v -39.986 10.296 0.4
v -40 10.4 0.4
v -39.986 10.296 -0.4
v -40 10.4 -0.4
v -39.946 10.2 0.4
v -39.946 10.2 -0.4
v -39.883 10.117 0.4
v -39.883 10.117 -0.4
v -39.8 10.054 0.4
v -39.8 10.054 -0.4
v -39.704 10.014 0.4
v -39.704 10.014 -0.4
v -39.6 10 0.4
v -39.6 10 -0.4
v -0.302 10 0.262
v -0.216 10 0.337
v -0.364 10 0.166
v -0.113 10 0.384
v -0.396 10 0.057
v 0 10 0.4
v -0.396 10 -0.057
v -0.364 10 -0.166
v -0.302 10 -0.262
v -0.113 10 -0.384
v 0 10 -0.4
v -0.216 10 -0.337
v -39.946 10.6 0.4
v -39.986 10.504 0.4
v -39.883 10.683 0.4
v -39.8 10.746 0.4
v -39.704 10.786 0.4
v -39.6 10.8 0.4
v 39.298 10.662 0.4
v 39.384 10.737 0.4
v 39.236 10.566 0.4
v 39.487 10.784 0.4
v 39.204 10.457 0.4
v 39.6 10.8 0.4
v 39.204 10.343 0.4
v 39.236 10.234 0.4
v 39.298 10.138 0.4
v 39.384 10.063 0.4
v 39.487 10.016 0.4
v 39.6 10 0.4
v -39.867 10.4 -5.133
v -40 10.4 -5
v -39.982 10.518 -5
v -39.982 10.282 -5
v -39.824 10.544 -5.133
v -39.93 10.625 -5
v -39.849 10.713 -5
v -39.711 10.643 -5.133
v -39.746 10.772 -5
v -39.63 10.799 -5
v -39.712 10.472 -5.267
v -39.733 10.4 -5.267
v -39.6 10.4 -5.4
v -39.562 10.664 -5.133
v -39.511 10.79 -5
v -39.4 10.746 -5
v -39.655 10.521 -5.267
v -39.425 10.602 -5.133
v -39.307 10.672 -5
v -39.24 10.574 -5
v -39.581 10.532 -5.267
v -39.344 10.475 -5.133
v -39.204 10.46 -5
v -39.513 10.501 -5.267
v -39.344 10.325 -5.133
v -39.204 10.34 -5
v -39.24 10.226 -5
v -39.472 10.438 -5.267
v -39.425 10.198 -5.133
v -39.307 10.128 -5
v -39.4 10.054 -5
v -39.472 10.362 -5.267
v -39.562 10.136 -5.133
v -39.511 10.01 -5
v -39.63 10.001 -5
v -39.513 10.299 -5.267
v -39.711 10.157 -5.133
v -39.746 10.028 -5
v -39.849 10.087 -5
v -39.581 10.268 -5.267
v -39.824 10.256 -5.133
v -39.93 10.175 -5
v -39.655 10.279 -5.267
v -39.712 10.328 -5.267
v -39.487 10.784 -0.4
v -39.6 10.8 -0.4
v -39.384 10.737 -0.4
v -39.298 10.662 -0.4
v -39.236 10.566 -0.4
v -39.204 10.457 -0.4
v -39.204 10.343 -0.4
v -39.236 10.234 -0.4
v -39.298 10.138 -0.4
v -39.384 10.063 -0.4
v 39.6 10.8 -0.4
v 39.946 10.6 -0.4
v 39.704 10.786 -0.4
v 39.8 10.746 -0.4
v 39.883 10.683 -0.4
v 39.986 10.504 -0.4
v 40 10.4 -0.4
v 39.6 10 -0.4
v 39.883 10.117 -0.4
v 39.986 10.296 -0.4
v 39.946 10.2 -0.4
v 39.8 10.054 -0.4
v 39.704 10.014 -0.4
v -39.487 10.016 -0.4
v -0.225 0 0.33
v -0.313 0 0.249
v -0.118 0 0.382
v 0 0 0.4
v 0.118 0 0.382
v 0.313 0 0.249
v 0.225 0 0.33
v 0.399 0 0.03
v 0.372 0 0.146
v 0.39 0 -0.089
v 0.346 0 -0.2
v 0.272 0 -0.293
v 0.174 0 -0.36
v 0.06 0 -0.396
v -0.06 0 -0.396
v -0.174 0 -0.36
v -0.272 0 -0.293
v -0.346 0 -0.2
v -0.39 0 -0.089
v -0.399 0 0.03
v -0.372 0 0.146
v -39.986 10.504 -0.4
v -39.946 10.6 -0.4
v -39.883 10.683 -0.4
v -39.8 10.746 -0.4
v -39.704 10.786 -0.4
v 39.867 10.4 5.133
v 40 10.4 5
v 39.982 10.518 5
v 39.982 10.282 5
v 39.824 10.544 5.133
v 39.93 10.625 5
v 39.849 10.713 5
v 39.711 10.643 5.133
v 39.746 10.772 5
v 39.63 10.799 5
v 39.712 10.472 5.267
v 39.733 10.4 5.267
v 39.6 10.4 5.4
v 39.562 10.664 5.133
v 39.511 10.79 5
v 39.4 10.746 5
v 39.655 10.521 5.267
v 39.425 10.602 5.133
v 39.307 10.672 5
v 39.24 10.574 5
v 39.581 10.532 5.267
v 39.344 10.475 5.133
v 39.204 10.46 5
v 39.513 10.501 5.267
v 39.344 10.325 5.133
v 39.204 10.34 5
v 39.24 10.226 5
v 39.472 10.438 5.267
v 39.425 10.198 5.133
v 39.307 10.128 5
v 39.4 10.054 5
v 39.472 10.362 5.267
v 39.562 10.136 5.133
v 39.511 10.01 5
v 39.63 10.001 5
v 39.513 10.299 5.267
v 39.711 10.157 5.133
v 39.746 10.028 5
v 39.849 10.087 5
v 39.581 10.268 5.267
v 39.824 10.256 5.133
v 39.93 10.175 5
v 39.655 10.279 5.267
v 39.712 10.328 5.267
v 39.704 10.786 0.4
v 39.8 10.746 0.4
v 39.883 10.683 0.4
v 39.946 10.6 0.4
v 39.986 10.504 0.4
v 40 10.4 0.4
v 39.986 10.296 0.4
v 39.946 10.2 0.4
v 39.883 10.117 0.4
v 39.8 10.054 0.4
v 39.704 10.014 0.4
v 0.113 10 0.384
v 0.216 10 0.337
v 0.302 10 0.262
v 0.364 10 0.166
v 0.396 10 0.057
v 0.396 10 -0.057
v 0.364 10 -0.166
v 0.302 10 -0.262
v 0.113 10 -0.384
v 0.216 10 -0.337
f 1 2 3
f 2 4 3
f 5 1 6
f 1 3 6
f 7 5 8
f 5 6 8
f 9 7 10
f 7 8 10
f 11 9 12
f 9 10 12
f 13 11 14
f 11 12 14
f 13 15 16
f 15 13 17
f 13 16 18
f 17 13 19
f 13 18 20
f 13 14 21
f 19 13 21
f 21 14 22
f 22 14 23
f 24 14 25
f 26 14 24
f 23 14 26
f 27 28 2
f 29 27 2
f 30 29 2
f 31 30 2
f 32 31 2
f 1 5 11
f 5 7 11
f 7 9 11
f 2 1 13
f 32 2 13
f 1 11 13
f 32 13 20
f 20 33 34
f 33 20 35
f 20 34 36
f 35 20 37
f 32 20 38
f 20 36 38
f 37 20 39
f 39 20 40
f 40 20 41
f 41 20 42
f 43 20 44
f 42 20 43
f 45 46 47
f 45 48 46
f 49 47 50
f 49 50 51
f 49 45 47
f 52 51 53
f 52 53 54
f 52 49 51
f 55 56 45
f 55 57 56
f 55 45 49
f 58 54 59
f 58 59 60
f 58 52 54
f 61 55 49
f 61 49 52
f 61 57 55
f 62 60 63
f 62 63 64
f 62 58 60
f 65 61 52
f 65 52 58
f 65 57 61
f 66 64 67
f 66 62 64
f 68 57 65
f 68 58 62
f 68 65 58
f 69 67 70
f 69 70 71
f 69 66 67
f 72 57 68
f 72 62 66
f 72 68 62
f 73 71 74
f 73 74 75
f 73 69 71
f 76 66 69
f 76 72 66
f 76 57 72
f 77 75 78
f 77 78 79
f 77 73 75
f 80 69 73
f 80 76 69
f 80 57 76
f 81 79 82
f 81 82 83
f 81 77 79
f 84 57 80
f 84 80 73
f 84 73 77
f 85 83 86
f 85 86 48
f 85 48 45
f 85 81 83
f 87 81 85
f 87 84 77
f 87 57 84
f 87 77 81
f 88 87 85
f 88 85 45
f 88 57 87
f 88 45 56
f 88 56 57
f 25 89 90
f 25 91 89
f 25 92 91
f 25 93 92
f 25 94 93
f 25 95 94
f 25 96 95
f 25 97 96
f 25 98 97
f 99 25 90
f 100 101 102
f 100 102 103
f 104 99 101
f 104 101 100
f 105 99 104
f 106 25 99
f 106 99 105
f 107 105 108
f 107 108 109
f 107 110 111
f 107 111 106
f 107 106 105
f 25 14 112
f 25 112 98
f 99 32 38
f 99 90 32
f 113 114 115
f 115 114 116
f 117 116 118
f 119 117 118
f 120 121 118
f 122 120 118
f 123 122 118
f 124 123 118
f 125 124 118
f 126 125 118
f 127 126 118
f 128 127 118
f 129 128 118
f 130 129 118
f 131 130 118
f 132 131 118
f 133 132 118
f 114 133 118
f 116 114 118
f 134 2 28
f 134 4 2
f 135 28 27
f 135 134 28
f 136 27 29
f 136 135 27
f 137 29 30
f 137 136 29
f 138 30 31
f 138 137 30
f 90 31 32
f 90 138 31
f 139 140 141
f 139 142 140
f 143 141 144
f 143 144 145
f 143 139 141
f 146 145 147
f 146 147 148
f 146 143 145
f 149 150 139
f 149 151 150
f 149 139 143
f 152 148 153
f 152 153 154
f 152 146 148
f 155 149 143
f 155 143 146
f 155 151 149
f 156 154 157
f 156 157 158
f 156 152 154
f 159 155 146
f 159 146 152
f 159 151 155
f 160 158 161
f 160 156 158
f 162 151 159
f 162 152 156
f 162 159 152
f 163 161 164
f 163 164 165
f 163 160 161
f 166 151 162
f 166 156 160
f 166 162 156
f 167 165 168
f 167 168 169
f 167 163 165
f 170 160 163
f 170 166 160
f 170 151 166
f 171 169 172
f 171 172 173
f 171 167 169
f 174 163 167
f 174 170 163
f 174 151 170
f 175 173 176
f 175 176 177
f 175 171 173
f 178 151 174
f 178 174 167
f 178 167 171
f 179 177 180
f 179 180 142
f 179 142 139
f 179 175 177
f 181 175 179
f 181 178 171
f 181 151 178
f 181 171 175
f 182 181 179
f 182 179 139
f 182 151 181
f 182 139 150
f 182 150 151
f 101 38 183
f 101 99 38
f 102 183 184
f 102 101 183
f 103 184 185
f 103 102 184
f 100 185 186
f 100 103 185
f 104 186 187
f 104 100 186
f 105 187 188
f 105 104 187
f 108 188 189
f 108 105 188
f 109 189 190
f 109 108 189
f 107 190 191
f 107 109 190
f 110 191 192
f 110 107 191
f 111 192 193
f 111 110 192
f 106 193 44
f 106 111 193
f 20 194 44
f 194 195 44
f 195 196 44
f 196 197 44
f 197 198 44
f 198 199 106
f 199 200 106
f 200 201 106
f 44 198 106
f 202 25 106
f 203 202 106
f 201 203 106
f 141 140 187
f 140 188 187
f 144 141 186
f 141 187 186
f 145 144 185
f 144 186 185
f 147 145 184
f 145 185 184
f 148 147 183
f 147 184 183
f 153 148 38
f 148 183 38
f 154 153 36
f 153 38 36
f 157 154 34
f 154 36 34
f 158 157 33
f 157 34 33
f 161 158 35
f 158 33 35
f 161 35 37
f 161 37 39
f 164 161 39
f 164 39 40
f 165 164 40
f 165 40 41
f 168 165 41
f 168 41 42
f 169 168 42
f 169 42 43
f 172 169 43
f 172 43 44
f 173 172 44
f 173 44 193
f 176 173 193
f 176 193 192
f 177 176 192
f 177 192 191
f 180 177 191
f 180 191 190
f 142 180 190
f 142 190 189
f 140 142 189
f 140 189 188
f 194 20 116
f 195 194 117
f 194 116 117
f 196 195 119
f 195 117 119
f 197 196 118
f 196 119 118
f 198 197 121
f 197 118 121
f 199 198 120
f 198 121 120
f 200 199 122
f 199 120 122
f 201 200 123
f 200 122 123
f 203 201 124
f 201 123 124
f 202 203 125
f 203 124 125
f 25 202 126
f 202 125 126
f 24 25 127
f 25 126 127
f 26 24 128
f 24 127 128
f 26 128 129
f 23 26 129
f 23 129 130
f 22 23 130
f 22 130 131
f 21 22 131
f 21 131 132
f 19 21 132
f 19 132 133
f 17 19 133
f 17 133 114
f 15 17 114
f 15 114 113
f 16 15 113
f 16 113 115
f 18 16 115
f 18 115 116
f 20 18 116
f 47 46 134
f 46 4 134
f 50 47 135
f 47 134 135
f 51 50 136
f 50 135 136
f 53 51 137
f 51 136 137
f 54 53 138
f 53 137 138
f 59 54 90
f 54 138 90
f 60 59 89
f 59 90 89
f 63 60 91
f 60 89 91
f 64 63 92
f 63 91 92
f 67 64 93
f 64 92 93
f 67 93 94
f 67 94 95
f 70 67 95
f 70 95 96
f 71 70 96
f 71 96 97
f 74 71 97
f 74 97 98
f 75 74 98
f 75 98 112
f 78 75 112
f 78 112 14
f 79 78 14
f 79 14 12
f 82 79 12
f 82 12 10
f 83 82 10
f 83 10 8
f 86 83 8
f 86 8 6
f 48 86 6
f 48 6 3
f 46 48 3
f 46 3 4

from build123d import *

# Parameters (mm, degrees)
SKETCH_1_R      = 0.4
EXTRUDE_1_DEPTH = 10
SKETCH_2_W      = 80
SKETCH_2_H      = 0.8
EXTRUDE_2_DEPTH = 0.8
FILLET_1_R      = 0.4
SKETCH_3_R      = 0.4
EXTRUDE_3_DEPTH = 5
SKETCH_4_R      = 0.4
EXTRUDE_4_DEPTH = 5
CHAMFER_1_SIZE  = 0.4


with BuildPart() as part:
    # 草图1 → 凸台-拉伸1 (new body)
    with BuildSketch(Plane(origin=(0, 0, 0), x_dir=(1, 0, 0), z_dir=(0, 1, 0))):
        with Locations(Location((0, 0, 0), (0, 0, 270))):
            Circle(SKETCH_1_R)
    extrude(amount=EXTRUDE_1_DEPTH)

    # 草图2 → 凸台-拉伸2 (add)
    with BuildSketch(Plane(origin=(0, 10, 0), x_dir=(1, 0, 0), z_dir=(0, 1, 0))):
        Rectangle(SKETCH_2_W, SKETCH_2_H)
    extrude(amount=EXTRUDE_2_DEPTH)

    # 圆角1
    fillet_1_edges = [part.edges().sort_by_distance(p)[0] for p in [
        (40, 10, 0),
        (40, 10.8, 0),
        (-40, 10, 0),
        (-40, 10.8, 0),
    ]]
    fillet(fillet_1_edges, radius=FILLET_1_R - 0.0001)  # a hair under: the kernel refuses the full size

    # 草图3 → 凸台-拉伸3 (add)
    with BuildSketch(Plane.XY.offset(0.4)):
        with Locations((39.6, 10.4)):
            Circle(SKETCH_3_R)
    extrude(amount=EXTRUDE_3_DEPTH)

    # 草图4 → 凸台-拉伸4 (add)
    with BuildSketch(Plane(origin=(0, 0, -0.4), x_dir=(-1, 0, 0), z_dir=(0, 0, -1))):
        with Locations((39.6, 10.4)):
            Circle(SKETCH_4_R)
    extrude(amount=EXTRUDE_4_DEPTH)

    # 倒角1
    chamfer_1_edges = [part.edges().sort_by_distance(p)[0] for p in [
        (39.2, 10.4, 5.4),
        (-39.2, 10.4, -5.4),
    ]]
    chamfer(chamfer_1_edges, length=CHAMFER_1_SIZE - 0.0001)  # a hair under: the kernel refuses the full size


solid = part.part
